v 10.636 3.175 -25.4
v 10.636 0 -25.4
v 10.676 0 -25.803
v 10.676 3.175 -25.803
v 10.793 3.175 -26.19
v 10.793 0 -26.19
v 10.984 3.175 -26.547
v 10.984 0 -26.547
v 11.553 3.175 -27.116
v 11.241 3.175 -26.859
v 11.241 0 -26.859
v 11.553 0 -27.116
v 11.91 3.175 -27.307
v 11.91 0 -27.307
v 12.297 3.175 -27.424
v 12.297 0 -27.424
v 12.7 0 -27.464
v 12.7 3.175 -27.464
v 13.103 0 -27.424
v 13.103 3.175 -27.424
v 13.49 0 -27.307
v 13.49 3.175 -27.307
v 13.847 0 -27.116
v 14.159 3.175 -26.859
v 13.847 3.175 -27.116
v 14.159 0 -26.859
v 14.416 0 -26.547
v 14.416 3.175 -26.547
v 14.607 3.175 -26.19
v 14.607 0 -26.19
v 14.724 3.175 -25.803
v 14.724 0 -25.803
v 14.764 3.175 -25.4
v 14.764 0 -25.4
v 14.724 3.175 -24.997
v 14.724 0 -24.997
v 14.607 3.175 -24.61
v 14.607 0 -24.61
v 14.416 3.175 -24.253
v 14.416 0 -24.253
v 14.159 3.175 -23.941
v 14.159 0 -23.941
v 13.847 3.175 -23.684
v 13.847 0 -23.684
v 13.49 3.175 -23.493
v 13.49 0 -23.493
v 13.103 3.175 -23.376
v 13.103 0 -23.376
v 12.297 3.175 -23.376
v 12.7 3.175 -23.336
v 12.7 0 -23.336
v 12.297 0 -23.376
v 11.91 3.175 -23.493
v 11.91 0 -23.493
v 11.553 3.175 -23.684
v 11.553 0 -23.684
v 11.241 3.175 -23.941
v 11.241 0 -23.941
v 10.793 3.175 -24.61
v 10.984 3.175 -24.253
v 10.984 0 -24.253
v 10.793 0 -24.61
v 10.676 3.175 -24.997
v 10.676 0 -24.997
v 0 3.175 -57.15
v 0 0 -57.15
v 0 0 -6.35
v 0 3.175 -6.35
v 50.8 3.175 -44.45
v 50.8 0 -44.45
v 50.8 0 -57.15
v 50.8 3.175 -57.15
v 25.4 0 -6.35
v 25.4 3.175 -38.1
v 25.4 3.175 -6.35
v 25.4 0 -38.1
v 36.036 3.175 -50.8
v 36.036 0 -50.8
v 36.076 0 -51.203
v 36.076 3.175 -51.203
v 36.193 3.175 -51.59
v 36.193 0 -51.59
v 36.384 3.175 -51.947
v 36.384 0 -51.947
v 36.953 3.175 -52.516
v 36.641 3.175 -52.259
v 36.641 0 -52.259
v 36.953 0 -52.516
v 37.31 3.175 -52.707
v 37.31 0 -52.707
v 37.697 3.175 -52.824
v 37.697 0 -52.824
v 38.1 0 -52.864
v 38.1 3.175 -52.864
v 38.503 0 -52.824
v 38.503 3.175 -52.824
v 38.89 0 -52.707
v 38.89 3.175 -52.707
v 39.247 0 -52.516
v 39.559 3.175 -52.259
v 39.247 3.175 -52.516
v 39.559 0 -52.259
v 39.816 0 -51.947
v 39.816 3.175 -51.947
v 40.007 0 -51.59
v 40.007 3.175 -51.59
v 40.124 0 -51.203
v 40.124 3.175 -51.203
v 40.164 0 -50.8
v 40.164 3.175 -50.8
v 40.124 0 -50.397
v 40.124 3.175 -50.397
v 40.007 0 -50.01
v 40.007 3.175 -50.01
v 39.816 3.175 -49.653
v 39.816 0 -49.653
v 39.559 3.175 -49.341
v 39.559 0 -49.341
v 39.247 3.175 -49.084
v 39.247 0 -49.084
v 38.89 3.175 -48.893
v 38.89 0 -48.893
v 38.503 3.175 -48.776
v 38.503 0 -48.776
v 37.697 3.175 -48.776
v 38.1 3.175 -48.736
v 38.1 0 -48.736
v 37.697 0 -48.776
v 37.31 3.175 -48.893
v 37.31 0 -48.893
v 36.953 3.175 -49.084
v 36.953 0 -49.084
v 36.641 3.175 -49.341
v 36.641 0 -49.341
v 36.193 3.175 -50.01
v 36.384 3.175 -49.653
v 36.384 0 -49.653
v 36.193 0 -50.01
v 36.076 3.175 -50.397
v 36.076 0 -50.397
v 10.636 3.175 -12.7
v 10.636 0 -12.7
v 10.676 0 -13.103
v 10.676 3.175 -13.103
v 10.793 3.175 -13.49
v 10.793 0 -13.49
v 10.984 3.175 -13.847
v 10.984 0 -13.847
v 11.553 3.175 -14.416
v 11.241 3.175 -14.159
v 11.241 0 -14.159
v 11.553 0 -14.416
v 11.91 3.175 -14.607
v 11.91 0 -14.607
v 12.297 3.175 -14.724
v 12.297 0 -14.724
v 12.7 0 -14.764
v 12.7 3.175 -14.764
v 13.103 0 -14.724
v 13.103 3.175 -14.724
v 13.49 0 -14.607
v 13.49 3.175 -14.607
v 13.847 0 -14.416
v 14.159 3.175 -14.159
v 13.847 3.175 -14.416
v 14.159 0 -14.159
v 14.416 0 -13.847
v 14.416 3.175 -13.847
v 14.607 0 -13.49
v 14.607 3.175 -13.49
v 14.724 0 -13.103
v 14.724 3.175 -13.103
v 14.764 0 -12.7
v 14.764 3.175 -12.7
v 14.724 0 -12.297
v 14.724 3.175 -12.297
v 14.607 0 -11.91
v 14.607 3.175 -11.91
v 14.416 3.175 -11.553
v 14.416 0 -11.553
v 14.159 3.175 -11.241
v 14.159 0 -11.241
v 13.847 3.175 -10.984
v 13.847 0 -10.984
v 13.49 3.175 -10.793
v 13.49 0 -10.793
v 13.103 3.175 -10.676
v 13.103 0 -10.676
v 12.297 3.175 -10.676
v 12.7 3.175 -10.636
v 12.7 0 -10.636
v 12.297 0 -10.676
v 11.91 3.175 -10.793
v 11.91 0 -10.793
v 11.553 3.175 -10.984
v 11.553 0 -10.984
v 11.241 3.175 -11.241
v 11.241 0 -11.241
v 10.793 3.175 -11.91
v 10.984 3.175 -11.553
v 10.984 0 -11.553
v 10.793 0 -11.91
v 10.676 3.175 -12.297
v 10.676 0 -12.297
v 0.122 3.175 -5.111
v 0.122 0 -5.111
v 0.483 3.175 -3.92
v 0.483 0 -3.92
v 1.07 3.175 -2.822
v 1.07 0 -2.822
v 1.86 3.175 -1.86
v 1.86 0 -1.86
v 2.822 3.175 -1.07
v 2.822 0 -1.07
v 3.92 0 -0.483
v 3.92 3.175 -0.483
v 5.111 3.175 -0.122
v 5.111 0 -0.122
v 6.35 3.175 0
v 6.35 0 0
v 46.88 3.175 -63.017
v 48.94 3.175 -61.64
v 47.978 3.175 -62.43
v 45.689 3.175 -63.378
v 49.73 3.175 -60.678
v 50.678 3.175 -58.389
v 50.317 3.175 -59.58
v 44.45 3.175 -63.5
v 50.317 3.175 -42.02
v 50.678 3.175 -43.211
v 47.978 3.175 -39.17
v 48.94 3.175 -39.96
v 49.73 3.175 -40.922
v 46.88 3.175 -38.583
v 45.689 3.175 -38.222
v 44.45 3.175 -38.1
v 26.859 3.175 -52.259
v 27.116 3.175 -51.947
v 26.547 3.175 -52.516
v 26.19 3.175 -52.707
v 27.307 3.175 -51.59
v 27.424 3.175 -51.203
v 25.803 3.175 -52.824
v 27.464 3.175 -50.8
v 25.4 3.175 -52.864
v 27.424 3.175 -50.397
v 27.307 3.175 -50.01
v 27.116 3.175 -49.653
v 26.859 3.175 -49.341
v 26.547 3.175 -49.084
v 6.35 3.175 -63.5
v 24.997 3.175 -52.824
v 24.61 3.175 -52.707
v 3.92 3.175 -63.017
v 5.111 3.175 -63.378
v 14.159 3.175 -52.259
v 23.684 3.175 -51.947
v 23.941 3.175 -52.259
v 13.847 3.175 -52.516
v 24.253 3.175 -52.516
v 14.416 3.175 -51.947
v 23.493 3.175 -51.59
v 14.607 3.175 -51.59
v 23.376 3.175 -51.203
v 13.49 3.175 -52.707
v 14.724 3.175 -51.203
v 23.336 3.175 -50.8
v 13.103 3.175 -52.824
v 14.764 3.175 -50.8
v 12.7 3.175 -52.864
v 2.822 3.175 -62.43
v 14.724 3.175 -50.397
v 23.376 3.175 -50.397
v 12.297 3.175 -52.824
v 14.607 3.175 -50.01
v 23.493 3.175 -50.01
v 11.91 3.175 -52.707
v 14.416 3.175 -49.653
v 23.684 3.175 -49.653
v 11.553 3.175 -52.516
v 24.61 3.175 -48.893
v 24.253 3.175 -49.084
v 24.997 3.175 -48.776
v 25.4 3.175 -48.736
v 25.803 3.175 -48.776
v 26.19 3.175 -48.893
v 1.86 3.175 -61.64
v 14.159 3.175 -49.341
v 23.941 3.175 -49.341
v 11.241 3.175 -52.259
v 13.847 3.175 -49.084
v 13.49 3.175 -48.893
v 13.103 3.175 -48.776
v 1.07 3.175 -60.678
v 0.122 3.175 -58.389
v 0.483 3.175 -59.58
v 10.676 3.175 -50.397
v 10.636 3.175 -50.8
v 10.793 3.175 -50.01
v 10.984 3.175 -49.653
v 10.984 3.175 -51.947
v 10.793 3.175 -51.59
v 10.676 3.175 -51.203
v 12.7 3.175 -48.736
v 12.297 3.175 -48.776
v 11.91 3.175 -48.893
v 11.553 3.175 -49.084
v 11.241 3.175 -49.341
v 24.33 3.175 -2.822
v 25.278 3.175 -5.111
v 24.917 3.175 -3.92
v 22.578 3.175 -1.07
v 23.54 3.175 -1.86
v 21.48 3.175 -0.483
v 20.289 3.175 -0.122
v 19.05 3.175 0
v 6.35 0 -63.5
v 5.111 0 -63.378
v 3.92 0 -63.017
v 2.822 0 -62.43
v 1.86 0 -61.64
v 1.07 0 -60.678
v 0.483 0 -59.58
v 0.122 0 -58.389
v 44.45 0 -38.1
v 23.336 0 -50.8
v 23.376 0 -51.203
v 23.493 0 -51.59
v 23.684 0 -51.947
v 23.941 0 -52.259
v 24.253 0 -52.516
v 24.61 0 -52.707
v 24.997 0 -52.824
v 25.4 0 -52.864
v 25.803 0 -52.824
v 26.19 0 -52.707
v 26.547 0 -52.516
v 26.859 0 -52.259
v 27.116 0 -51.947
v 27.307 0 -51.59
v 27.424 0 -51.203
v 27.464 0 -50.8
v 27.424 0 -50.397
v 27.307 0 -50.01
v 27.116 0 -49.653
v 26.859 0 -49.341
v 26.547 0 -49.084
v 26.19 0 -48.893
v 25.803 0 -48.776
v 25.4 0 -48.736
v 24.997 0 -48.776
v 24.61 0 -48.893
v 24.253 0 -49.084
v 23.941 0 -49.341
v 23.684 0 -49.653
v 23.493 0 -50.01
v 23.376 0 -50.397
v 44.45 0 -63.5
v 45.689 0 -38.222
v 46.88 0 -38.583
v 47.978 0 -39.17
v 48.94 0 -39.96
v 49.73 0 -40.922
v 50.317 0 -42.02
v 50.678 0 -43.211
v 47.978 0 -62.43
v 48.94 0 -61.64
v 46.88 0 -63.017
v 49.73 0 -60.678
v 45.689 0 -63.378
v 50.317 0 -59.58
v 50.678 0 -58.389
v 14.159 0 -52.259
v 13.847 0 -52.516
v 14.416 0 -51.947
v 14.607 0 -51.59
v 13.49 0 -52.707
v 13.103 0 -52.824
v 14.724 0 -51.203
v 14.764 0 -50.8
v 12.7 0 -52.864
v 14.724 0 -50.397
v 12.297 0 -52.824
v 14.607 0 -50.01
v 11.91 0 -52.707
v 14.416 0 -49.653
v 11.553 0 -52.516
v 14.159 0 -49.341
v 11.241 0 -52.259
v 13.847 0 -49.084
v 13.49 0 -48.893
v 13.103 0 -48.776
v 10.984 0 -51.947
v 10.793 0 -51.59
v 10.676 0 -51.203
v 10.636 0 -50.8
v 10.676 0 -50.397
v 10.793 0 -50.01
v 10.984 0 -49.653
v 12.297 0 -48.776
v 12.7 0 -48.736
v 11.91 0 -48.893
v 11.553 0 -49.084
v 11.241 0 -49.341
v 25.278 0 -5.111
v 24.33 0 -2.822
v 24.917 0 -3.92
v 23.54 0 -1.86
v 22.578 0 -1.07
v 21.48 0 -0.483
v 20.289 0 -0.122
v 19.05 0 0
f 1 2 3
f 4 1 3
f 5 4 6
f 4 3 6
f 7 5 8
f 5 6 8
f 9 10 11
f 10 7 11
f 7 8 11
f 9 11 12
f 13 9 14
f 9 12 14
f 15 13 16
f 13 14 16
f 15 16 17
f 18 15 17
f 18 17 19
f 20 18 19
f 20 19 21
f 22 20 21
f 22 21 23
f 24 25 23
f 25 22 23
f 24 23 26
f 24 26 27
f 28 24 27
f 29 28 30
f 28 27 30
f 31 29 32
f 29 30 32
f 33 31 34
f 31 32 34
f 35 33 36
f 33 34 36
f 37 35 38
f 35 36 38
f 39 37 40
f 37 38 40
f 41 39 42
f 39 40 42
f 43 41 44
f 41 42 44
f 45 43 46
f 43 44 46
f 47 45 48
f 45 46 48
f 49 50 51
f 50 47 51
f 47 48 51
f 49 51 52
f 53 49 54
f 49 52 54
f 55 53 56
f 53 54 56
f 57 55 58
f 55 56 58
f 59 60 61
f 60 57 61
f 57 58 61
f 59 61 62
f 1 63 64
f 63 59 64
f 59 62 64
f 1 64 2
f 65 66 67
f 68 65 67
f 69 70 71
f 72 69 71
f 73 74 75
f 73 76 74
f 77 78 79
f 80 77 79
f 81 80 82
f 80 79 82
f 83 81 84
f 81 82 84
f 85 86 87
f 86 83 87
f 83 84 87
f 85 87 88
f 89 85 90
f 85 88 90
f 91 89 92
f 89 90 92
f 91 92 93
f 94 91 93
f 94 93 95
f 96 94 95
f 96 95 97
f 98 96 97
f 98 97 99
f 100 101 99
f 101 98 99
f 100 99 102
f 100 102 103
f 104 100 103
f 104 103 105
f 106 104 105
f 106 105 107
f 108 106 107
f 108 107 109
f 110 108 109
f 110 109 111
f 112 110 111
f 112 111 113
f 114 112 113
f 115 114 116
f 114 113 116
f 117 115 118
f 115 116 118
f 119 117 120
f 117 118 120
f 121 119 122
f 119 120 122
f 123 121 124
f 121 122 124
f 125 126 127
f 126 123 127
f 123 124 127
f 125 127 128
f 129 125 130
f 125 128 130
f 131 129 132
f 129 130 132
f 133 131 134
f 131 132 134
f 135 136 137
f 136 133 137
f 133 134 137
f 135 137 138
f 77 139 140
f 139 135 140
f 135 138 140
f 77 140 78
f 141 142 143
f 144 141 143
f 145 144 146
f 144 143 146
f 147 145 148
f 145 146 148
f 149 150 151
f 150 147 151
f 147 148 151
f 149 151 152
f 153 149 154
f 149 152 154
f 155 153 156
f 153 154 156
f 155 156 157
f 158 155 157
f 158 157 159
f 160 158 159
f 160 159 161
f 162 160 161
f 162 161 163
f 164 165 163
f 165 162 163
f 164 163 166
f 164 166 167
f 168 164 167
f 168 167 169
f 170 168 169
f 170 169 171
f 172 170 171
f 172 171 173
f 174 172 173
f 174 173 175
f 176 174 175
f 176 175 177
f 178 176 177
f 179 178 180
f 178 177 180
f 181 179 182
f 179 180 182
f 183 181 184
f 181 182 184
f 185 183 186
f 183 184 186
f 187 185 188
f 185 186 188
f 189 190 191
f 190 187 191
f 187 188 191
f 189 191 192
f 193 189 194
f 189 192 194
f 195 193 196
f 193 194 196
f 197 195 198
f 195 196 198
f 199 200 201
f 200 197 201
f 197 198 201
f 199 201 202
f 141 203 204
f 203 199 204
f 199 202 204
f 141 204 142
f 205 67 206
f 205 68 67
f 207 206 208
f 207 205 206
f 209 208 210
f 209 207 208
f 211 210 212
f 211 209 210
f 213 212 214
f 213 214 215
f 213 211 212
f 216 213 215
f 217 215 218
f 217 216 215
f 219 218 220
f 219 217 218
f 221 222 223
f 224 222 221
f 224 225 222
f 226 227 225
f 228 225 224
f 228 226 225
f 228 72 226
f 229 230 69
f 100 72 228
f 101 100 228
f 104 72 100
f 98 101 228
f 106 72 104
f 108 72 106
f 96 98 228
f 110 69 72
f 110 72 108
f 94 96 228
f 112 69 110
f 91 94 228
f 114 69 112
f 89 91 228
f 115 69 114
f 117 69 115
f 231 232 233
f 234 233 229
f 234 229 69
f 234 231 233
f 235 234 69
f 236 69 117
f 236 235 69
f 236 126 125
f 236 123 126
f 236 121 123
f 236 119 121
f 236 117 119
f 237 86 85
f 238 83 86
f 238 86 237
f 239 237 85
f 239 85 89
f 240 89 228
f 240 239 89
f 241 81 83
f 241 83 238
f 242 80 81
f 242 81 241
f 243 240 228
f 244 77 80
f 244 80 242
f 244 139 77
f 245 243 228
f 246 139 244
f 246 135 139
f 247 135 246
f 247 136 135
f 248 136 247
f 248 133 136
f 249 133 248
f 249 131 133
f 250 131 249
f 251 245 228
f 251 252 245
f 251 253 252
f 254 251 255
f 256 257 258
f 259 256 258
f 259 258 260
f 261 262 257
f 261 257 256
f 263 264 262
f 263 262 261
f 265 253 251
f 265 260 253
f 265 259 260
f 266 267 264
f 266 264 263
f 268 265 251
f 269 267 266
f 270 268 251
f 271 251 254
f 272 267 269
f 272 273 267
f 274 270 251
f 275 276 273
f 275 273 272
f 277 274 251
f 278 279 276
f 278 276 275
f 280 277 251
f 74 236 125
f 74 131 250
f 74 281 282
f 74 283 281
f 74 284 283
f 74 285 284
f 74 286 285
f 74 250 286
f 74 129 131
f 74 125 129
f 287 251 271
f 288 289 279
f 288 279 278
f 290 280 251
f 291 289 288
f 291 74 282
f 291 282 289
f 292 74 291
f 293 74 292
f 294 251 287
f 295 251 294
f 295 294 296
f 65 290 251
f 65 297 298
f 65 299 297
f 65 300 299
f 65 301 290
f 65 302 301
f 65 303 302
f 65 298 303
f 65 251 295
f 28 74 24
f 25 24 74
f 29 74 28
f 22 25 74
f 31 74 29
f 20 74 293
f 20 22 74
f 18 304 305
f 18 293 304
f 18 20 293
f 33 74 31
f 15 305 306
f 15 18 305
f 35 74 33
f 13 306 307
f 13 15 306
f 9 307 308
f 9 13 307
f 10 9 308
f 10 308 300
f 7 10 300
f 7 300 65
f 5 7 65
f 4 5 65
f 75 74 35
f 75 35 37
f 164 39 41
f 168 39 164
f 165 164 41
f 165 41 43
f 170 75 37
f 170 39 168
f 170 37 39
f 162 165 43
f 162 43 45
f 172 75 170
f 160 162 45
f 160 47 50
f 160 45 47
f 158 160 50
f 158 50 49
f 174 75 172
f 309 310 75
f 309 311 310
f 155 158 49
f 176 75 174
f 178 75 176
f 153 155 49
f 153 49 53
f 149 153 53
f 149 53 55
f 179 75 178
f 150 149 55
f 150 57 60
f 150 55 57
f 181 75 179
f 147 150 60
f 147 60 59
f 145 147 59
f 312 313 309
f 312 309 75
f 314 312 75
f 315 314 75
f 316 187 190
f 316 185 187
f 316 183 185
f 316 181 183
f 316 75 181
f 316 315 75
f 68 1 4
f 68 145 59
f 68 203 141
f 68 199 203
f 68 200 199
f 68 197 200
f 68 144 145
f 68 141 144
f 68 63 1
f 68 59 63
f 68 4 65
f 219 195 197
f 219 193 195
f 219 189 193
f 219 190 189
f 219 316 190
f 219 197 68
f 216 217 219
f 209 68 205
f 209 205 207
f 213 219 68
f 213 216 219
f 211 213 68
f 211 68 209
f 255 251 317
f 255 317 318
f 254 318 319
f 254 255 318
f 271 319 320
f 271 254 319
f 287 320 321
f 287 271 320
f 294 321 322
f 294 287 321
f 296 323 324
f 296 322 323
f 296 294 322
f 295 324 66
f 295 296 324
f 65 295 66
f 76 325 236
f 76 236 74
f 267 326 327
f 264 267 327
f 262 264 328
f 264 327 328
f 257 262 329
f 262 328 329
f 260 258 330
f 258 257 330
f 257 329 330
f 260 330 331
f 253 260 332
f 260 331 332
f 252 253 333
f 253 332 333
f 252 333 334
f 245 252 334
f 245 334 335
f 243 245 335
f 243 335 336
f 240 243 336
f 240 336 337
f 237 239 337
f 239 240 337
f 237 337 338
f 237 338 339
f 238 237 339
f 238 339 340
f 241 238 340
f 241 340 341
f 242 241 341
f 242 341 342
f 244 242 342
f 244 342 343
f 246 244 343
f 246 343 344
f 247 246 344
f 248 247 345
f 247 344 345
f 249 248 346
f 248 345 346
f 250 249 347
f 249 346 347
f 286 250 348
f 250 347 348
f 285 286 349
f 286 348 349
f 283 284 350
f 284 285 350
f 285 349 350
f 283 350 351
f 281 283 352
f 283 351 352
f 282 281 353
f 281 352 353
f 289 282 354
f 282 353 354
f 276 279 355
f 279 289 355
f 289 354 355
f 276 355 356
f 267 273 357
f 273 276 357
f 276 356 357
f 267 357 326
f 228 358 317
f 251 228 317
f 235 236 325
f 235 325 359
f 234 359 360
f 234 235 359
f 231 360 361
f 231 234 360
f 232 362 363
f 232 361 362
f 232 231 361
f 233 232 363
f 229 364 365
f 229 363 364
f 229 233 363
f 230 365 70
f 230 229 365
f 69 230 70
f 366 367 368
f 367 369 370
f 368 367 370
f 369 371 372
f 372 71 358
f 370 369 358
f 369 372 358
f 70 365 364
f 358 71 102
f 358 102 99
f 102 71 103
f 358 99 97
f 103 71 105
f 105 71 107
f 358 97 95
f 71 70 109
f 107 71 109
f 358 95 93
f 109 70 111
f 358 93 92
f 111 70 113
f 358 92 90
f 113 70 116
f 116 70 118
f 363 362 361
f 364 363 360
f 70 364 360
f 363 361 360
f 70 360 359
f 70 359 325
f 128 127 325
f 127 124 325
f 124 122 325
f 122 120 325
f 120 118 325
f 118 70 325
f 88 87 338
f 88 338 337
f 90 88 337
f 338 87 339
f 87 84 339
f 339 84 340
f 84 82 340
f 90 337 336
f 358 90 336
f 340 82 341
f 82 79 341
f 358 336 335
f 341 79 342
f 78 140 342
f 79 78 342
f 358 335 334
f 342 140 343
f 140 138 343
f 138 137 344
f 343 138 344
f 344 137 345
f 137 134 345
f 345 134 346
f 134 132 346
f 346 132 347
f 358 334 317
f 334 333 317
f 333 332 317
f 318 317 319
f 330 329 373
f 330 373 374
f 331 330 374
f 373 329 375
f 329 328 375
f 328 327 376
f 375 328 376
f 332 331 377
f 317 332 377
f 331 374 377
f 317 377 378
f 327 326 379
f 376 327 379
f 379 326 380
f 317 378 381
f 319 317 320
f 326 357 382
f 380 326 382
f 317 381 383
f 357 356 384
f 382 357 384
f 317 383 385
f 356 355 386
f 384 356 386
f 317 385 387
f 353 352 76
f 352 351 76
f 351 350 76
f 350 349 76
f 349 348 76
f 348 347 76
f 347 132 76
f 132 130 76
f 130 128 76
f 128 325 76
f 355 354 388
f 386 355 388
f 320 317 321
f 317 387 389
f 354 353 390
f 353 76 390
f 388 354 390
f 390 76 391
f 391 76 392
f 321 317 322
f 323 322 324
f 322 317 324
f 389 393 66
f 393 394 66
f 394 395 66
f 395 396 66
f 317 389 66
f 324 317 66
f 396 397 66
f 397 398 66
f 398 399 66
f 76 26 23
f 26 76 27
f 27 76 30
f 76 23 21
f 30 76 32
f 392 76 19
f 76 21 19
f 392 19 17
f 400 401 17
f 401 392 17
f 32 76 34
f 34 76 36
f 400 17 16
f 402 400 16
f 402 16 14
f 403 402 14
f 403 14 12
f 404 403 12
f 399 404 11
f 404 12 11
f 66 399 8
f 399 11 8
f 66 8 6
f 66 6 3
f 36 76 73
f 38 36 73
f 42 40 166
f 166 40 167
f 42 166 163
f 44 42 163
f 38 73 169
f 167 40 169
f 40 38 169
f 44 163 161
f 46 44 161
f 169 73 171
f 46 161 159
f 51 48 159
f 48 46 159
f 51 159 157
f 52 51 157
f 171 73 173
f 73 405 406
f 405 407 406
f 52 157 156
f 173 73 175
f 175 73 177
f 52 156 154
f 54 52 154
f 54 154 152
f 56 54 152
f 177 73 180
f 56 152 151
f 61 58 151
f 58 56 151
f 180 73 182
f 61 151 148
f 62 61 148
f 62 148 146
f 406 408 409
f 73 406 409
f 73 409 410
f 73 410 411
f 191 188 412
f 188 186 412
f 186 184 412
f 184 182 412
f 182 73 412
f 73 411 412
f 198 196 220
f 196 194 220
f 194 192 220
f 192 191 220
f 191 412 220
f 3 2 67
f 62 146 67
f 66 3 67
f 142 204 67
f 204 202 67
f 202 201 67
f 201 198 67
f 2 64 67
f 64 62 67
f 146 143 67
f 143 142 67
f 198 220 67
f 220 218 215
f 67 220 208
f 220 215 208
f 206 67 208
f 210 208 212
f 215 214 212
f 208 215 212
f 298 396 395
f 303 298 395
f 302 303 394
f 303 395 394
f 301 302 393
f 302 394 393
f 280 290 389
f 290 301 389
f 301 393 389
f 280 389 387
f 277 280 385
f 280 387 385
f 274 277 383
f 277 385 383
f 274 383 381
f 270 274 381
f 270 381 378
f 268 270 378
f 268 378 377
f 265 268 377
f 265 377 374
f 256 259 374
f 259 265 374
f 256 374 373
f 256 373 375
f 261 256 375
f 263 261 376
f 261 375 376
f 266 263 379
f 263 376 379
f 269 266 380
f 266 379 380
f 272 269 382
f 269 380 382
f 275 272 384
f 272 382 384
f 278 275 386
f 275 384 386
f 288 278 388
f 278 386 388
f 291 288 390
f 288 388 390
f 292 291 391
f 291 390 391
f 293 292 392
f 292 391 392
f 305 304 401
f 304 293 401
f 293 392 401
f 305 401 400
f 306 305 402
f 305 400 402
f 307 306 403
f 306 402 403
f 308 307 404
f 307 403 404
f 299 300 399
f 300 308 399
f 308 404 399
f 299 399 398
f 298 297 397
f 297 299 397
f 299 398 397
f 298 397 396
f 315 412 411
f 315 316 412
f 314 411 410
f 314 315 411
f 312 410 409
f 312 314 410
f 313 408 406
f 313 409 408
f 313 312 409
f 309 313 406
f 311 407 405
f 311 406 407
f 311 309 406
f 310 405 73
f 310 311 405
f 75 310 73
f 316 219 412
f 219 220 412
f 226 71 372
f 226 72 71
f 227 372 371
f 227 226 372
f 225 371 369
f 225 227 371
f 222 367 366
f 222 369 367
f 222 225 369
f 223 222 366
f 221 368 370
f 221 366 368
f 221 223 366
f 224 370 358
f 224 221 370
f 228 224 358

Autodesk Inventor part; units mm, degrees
ref_plane "YZ Plane" through (0, 0, 0) normal (1, 0, 0) x (0, 1, 0)
ref_plane "XZ Plane" through (0, 0, 0) normal (0, 1, 0) x (-1, 0, 0)
ref_plane "XY Plane" through (0, 0, 0) normal (0, 0, 1) x (1, 0, 0)
sketch "Sketch1" plane through (0, 0, 0) normal (0, 1, 0) x (-1, 0, 0)
  line L0 (0, 0) -> (-50.8, 0)
  line L1 (-50.8, 0) -> (-50.8, -63.5)
  line L2 (-50.8, -63.5) -> (0, -63.5)
  line L3 (0, -63.5) -> (0, 0)
  line L4 (-50.8, -63.5) -> (-50.8, -38.1)
  line L5 (-50.8, -38.1) -> (-25.4, -38.1)
  line L6 (-25.4, -38.1) -> (-25.4, 0)
  circle A0 centre (-25.4, -50.8) radius 2.0638
  line L7 (-50.8, -50.8) -> (0, -50.8) construction
  circle A1 centre (-38.1, -50.8) radius 2.0637
  circle A2 centre (-12.7, -50.8) radius 2.0637
  line L8 (-12.7, -63.5) -> (-12.7, 0) construction
  circle A3 centre (-12.7, -25.4) radius 2.0638
  circle A4 centre (-12.7, -12.7) radius 2.0638
  dimension "d22" = 50.8
  dimension "d23" = 63.5
  dimension "d24" = 25.4
  dimension "d25" = 25.4
  dimension "d26" = 4.1275
  dimension "d27" = 4.1275
  dimension "d28" = 12.7
  dimension "d29" = 4.1275
  dimension "d30" = 12.7
  dimension "d31" = 4.1275
  dimension "d32" = 25.4
  dimension "d33" = 4.1275
  dimension "d34" = 12.7
extrude "Extrusion1" add sketch "Sketch1" along normal blind 3.175 contours L3 L2 L1 L5 L6 L0
fillet "Fillet1" radius 6.35 5 edges at (50.8, 1.5875, -38.1) (25.4, 1.5875, 0) (0, 1.5875, 0) (0, 1.5875, -63.5) (50.8, 1.5875, -63.5)
properties part number "fram_support_gusset"
